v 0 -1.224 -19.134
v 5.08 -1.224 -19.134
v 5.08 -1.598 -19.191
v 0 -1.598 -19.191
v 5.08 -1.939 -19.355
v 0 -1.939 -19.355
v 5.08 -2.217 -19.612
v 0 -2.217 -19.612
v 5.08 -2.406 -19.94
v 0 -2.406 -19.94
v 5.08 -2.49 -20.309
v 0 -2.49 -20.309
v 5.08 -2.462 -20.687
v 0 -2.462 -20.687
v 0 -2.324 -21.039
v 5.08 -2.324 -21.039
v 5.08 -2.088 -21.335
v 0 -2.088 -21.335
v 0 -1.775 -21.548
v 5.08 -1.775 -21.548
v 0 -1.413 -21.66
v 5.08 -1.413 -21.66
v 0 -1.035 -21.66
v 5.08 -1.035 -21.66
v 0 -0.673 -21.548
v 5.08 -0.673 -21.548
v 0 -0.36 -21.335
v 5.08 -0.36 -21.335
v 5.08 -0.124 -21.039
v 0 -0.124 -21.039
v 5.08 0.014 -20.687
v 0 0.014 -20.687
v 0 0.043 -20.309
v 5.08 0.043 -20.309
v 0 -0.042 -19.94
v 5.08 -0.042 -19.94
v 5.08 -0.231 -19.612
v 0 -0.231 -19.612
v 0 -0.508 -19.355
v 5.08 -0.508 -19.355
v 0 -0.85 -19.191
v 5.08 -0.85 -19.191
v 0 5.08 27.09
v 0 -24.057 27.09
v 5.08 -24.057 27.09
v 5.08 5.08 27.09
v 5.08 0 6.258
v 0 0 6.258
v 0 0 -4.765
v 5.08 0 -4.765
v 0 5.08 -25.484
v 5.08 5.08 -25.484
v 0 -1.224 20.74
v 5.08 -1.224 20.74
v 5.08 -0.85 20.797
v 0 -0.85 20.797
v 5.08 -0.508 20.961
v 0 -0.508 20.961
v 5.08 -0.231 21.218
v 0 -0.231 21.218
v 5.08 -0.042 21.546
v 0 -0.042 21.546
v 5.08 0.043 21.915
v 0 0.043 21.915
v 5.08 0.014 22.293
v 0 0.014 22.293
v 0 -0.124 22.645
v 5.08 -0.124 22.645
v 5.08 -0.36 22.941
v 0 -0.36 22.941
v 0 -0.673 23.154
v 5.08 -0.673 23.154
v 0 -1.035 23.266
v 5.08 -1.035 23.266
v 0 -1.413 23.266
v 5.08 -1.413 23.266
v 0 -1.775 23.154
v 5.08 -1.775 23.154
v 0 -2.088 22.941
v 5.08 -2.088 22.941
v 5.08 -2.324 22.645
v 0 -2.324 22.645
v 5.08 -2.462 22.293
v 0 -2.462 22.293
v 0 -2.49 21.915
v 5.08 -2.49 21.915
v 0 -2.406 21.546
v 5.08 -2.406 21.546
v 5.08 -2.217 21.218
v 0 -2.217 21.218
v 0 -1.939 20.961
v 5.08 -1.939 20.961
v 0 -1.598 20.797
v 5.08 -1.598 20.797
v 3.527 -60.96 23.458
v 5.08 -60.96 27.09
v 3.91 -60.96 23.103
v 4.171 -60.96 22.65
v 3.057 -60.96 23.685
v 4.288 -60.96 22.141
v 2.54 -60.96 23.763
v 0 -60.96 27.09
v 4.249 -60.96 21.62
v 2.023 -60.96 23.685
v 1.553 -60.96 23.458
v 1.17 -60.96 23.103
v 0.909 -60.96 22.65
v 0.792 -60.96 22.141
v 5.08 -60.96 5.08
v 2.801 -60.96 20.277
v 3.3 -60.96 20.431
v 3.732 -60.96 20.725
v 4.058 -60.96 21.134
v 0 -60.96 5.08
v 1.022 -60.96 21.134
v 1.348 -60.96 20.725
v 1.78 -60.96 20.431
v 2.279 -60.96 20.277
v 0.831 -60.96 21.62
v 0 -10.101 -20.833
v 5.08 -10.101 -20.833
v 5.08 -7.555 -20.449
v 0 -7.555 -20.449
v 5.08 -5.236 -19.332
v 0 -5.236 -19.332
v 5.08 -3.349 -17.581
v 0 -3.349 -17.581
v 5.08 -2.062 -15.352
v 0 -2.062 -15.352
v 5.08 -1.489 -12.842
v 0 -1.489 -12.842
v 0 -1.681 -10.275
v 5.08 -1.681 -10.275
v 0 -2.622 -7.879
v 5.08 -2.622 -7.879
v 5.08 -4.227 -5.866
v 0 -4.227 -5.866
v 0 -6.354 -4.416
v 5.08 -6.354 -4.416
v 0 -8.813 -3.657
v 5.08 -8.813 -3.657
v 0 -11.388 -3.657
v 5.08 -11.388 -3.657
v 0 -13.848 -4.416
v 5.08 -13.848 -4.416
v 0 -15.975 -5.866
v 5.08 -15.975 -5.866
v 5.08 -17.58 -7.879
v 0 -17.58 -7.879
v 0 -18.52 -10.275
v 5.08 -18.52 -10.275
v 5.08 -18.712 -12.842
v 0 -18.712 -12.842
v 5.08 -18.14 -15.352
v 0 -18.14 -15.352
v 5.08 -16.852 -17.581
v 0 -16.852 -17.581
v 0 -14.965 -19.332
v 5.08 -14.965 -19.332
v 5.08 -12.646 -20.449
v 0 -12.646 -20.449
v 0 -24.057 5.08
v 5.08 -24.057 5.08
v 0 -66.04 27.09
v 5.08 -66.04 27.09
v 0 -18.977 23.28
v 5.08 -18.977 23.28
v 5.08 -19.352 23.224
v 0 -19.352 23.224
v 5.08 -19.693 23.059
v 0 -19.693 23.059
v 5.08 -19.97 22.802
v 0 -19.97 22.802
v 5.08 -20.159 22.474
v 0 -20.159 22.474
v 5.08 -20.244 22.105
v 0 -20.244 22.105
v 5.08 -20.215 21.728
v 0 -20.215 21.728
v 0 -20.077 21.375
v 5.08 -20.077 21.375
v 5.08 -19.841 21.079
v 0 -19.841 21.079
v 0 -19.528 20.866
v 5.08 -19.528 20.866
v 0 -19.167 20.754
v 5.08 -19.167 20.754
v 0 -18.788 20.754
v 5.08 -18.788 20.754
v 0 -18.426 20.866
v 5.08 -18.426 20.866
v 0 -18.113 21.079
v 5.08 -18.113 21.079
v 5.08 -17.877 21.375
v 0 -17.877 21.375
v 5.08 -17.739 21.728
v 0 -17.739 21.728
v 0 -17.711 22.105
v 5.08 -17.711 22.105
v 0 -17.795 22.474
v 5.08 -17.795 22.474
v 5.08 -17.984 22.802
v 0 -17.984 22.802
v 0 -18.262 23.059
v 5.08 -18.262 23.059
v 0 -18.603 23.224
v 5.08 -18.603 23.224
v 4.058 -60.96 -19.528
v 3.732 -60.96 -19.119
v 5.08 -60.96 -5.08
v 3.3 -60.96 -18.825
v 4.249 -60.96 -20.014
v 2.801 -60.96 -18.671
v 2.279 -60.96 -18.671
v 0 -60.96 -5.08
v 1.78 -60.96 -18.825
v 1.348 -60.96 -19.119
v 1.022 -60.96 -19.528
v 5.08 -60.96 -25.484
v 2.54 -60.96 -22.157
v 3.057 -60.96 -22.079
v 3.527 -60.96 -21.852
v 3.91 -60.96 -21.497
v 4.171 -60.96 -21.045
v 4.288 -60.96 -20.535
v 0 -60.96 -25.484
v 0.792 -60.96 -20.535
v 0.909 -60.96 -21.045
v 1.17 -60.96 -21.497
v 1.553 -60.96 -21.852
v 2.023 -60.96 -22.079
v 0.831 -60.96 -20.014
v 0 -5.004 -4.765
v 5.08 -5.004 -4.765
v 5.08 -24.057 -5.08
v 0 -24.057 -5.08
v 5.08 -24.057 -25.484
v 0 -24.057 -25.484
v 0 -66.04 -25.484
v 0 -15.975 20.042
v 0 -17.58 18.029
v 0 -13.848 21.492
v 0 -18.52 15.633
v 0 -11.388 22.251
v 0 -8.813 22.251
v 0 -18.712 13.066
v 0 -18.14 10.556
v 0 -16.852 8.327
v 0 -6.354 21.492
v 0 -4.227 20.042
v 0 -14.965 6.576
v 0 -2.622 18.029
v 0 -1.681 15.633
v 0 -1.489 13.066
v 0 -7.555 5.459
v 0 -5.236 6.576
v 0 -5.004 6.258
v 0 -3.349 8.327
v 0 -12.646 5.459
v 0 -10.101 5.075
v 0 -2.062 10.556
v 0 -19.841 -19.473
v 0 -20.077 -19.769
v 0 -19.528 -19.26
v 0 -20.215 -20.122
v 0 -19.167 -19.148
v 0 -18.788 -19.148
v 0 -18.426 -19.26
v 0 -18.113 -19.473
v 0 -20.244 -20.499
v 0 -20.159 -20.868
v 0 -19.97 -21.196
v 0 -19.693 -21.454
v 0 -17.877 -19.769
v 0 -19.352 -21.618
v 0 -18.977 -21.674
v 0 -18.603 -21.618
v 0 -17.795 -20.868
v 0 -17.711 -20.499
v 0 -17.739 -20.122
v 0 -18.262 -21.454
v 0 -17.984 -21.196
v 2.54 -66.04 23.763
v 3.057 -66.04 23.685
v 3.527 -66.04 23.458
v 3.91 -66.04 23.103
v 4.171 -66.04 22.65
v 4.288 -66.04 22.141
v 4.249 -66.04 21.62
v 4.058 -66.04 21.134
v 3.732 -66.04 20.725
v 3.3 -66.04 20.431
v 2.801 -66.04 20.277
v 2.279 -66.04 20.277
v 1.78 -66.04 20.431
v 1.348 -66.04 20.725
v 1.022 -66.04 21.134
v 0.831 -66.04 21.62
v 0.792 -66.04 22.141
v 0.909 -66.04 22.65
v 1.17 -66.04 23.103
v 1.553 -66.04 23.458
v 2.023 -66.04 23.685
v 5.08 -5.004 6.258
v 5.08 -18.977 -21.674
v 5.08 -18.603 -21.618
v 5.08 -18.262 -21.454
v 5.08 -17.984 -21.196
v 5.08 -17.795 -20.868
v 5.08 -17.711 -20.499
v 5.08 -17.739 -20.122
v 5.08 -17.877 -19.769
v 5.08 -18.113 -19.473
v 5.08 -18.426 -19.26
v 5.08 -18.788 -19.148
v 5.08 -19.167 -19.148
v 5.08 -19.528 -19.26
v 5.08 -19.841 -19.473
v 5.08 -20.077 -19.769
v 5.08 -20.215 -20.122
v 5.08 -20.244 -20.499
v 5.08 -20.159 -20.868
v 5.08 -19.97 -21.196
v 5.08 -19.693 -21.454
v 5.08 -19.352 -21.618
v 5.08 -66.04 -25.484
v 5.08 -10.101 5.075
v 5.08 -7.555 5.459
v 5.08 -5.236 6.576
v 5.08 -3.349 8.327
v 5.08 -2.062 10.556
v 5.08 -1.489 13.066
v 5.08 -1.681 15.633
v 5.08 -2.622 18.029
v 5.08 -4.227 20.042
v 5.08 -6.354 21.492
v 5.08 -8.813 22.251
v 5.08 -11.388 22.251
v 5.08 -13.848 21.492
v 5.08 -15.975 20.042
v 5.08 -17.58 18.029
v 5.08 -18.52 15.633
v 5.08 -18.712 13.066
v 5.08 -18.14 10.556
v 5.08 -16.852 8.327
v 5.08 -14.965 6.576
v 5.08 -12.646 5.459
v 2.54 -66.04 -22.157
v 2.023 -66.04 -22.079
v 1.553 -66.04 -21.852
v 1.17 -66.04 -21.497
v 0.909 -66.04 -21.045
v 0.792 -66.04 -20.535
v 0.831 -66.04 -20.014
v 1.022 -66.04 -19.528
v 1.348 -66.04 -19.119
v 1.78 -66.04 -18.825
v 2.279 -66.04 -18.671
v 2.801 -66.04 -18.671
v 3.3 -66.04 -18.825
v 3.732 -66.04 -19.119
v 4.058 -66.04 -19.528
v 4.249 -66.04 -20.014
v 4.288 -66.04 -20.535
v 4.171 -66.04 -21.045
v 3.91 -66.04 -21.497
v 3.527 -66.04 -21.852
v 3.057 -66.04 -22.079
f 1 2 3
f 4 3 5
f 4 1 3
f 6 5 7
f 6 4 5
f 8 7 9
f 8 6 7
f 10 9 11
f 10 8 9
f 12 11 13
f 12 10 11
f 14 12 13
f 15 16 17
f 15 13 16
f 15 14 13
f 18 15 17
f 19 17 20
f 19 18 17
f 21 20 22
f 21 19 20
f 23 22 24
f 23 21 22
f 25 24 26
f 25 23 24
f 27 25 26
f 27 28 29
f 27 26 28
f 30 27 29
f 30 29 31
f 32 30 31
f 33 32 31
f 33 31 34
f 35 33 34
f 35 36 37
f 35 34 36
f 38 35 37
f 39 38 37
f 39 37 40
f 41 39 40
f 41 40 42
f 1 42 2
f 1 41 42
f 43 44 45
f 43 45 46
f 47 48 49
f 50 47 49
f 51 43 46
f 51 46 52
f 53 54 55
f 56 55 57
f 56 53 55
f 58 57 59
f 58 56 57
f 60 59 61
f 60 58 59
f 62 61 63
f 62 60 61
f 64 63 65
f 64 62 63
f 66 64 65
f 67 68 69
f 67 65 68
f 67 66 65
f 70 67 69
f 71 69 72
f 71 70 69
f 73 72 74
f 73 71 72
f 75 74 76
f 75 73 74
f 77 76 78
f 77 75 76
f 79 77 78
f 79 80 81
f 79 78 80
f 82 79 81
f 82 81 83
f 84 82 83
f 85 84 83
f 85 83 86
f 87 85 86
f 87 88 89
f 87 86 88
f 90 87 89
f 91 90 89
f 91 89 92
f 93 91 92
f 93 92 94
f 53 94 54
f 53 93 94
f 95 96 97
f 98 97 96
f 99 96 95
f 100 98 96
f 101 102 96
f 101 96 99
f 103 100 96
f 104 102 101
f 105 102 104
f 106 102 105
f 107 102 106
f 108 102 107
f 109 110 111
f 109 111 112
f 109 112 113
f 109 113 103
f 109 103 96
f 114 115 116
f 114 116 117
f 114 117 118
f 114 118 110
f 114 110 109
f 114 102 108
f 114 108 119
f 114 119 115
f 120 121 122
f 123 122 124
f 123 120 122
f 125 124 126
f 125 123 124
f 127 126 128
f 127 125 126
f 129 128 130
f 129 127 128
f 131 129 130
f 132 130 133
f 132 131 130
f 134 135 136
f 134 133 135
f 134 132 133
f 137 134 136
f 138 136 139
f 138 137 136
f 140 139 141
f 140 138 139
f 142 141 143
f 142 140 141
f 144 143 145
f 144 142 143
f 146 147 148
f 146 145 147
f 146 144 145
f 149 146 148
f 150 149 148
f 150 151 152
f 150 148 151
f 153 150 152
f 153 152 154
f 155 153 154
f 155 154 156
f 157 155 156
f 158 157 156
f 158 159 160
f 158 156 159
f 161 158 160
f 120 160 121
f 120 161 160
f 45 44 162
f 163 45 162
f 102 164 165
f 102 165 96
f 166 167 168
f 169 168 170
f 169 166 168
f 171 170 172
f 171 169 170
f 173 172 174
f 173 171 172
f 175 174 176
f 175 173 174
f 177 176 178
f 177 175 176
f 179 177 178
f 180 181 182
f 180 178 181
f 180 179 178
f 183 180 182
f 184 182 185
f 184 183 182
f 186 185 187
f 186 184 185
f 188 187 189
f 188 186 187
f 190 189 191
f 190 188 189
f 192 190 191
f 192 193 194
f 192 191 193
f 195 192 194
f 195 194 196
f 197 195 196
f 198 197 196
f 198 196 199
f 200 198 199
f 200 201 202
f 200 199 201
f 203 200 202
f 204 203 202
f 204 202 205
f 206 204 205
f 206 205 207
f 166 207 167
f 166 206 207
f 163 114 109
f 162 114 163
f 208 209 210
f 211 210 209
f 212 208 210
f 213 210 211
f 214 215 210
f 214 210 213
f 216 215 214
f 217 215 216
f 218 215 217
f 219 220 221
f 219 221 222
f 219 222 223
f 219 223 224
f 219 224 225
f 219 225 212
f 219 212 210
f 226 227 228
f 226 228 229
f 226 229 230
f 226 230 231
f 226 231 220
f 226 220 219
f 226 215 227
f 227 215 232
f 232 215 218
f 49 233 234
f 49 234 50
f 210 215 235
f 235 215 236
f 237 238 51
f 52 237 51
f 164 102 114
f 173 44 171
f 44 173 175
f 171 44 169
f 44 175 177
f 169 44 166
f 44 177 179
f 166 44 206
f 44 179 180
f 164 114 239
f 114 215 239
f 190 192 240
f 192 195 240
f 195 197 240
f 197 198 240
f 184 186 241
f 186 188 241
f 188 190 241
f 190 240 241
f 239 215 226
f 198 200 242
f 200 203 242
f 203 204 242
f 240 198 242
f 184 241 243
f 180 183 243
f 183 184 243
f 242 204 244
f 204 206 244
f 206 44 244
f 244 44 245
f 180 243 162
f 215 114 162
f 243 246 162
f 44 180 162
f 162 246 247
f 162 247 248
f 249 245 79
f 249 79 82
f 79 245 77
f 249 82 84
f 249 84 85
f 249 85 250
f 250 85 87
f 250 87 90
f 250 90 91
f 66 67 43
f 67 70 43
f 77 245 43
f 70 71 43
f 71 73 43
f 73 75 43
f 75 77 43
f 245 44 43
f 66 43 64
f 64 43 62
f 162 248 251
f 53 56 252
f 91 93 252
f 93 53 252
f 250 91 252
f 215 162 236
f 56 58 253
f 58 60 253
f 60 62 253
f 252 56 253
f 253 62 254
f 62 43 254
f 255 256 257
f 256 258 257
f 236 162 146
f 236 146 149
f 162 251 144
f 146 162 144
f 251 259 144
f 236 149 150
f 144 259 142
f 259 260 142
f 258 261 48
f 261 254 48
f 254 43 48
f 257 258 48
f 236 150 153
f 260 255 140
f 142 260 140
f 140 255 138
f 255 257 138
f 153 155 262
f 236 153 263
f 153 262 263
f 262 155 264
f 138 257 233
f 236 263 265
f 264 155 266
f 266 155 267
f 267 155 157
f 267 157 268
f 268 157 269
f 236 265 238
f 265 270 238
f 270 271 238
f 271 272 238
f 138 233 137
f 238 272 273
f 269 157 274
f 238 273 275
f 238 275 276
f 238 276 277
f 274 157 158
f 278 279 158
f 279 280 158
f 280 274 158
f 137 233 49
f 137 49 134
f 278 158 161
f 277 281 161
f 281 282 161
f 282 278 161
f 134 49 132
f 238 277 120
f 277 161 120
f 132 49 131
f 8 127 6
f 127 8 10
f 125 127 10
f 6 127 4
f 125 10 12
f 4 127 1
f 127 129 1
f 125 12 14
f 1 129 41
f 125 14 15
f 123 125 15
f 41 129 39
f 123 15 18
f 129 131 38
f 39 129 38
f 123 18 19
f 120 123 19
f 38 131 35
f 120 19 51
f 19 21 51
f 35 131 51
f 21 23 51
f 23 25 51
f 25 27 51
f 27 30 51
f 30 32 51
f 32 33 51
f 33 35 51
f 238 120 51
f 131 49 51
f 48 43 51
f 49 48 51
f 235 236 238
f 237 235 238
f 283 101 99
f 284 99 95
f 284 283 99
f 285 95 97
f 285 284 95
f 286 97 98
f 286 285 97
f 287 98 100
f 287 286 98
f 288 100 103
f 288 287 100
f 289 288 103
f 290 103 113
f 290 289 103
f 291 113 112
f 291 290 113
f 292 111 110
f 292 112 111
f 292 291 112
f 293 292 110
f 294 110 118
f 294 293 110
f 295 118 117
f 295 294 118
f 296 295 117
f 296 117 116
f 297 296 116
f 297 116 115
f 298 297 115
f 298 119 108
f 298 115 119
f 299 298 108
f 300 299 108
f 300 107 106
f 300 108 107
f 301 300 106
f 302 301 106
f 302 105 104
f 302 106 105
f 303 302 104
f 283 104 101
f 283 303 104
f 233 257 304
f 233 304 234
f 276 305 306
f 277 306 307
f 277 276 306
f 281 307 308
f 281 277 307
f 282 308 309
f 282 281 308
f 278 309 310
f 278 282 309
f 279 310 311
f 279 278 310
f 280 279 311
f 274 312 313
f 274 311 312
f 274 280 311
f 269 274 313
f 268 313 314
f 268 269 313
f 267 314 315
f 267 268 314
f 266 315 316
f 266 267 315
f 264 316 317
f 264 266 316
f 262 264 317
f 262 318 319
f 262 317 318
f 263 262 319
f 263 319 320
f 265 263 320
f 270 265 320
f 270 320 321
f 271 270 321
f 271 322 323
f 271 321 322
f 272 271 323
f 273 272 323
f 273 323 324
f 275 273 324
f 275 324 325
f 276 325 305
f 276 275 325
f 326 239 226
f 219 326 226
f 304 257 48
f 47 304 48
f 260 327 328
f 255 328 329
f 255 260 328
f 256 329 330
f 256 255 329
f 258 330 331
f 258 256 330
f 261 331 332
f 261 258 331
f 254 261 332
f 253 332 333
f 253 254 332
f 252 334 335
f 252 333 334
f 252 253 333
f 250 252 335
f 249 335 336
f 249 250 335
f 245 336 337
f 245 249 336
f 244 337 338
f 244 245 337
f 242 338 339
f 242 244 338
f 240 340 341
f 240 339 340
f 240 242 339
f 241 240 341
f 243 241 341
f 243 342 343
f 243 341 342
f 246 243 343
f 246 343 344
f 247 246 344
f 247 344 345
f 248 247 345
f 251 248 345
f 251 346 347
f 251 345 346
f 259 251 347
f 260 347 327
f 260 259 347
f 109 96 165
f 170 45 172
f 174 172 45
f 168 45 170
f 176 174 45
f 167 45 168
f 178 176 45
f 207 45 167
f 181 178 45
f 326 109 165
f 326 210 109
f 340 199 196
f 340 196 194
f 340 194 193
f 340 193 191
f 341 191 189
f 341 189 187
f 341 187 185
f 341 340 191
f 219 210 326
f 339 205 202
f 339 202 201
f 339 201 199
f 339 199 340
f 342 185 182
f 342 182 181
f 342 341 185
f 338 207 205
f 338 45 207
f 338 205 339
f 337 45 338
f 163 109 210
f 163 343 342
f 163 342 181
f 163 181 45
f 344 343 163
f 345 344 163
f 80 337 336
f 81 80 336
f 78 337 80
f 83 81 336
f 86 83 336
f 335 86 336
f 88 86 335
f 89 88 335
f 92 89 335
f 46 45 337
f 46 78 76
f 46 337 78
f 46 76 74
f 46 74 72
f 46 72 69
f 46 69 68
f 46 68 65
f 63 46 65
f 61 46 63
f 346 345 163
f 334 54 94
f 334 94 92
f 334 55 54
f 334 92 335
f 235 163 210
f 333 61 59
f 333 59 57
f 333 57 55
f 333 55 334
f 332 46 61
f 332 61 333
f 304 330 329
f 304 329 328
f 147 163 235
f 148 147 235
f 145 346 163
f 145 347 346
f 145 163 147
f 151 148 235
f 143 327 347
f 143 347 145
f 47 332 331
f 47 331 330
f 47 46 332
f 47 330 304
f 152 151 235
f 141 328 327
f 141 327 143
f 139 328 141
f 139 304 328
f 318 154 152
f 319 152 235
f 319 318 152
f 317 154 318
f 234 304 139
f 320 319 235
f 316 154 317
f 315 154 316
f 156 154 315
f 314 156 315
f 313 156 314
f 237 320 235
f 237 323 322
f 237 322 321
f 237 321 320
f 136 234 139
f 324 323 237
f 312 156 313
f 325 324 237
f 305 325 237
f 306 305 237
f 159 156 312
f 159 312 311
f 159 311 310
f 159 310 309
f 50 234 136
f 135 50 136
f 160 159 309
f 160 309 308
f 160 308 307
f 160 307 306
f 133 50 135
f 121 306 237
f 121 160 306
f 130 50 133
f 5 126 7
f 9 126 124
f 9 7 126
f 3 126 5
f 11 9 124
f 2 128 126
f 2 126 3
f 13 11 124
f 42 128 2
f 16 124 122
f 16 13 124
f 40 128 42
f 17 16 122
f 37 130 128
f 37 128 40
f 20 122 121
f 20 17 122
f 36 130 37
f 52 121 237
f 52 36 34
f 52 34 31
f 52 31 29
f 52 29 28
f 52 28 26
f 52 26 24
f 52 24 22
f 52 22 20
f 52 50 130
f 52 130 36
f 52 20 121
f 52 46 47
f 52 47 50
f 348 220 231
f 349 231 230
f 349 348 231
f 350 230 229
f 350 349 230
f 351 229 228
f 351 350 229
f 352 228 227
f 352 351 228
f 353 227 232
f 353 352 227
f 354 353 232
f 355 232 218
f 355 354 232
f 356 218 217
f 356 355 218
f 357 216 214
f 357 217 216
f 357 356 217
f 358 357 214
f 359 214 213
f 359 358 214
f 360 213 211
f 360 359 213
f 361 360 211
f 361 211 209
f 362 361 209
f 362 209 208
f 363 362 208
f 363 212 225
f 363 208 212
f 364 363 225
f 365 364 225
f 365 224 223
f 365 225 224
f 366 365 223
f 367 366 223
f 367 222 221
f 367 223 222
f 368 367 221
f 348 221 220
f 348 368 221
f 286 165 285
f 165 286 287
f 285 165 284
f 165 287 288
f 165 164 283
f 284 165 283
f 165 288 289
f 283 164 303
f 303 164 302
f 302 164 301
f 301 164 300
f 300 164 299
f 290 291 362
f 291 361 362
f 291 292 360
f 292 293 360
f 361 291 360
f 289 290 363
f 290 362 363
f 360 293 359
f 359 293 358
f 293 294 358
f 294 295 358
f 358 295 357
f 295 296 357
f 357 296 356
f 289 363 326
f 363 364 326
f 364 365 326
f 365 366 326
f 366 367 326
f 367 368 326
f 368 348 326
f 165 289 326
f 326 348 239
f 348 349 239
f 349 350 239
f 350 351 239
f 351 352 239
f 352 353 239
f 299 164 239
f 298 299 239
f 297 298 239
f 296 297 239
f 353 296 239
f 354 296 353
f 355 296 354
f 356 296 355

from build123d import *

# Parameters (mm, degrees)
BOSS_EXTRUDE1_DEPTH = 5.08
SKETCH2_W           = 101.6
SKETCH2_H           = 10.16
CUT_EXTRUDE3_DEPTH  = 22.86
SKETCH9_R           = 1.27
CUT_EXTRUDE4_DEPTH  = 25.908
SKETCH13_W          = 11.0236
SKETCH13_H          = 5.0038
CUT_EXTRUDE5_DEPTH  = 25.908
SKETCH8_R           = 8.636
CUT_EXTRUDE6_DEPTH  = 25.908
SKETCH14_W          = 212.203069611
SKETCH14_H          = 122.52066239
SKETCH14_W_2        = 52.5744
SKETCH14_H_2        = 29.137232508
CUT_EXTRUDE7_DEPTH  = 25.908
SKETCH15_W          = 52.5744
SKETCH15_H          = 43.722211583
BOSS_EXTRUDE2_DEPTH = 5.08
SKETCH17_W          = 25.579382718
SKETCH17_H          = 36.902767492
CUT_EXTRUDE8_DEPTH  = 10.16
SKETCH18_R          = 1.7526
CUT_EXTRUDE9_DEPTH  = 10.16


with BuildPart() as part:
    # Sketch1 → Boss-Extrude1 (new body)
    with BuildSketch(Plane(origin=(0, 0, 0), x_dir=(0, 0, -1), z_dir=(1, 0, 0))):
        Polygon((62.997029703, -55.82970297), (88.397029703, -55.82970297), (88.397029703, -65.98970297), (-89.402970297, -65.98970297), (-89.402970297, -55.82970297), (-64.002970297, -55.82970297), (-64.002970297, 27.837475742), (62.997029703, 27.837475742), align=None)
    extrude(amount=BOSS_EXTRUDE1_DEPTH)

    # Sketch2 → Cut-Extrude3 (cut)
    with BuildSketch(Plane(origin=(0, 0, 0), x_dir=(0, 0, -1), z_dir=(1, 0, 0))):
        with Locations((-0.502970297, -60.90970297)):
            Rectangle(SKETCH2_W, SKETCH2_H)
    extrude(amount=CUT_EXTRUDE3_DEPTH, mode=Mode.SUBTRACT)

    # Sketch9 → Cut-Extrude4 (cut)
    with BuildSketch(Plane(origin=(0, 0, 0), x_dir=(0, 0, -1), z_dir=(1, 0, 0))):
        with Locations((-22.010170297, -1.223907747)):
            Circle(SKETCH9_R)
        with Locations(Location((-22.010170297, -18.977232508, 0), (0, 0, 180))):
            Circle(SKETCH9_R)
        with Locations((20.404229703, -18.977232508)):
            Circle(SKETCH9_R)
        with Locations(Location((20.404229703, -1.223907747, 0), (0, 0, 180))):
            Circle(SKETCH9_R)
    extrude(amount=CUT_EXTRUDE4_DEPTH, mode=Mode.SUBTRACT)

    # Sketch13 → Cut-Extrude5 (cut)
    with BuildSketch(Plane(origin=(0, 0, 0), x_dir=(0, 0, -1), z_dir=(1, 0, 0))):
        with Locations((-0.746414126, -2.5019)):
            Rectangle(SKETCH13_W, SKETCH13_H)
    extrude(amount=CUT_EXTRUDE5_DEPTH, mode=Mode.SUBTRACT)

    # Sketch8 → Cut-Extrude6 (cut)
    with BuildSketch(Plane(origin=(0, 0, 0), x_dir=(0, 0, -1), z_dir=(1, 0, 0))):
        with Locations((12.197029703, -10.100570128)):
            Circle(SKETCH8_R)
        with Locations((-13.710970297, -10.100570128)):
            Circle(SKETCH8_R)
    extrude(amount=CUT_EXTRUDE6_DEPTH, mode=Mode.SUBTRACT)

    # Sketch14 → Cut-Extrude7 (cut)
    with BuildSketch(Plane(origin=(0, 0, 0), x_dir=(0, 0, -1), z_dir=(1, 0, 0))):
        with Locations((-5.581398167, -16.698007888)):
            Rectangle(SKETCH14_W, SKETCH14_H)
        with Locations((-0.802970297, -9.488616254)):
            Rectangle(SKETCH14_W_2, SKETCH14_H_2, mode=Mode.SUBTRACT)
    extrude(amount=CUT_EXTRUDE7_DEPTH, mode=Mode.SUBTRACT)

    # Sketch15 → Boss-Extrude2 (add)
    with BuildSketch(Plane(origin=(0, 0, 0), x_dir=(0, 0, -1), z_dir=(1, 0, 0))):
        with Locations((-0.802970297, -44.178894209)):
            Rectangle(SKETCH15_W, SKETCH15_H)
    extrude(amount=BOSS_EXTRUDE2_DEPTH)

    # Sketch17 → Cut-Extrude8 (cut)
    with BuildSketch(Plane(origin=(0, 0, 0), x_dir=(0, 0, -1), z_dir=(1, 0, 0))):
        with Locations((-17.869691359, -42.508616254)):
            Rectangle(SKETCH17_W, SKETCH17_H)
        with Locations((17.869691359, -42.508616254)):
            Rectangle(SKETCH17_W, SKETCH17_H)
    extrude(amount=CUT_EXTRUDE8_DEPTH, mode=Mode.SUBTRACT)

    # Sketch18 → Cut-Extrude9 (cut)
    with BuildSketch(Plane(origin=(0, -66.04, 0), x_dir=(1, 0, 0), z_dir=(0, 1, 0))):
        with Locations(Location((2.54, -22.010170297, 0), (0, 0, 270))):
            Circle(SKETCH18_R)
        with Locations(Location((2.54, 20.404229703, 0), (0, 0, 90))):
            Circle(SKETCH18_R)
    extrude(amount=CUT_EXTRUDE9_DEPTH, mode=Mode.SUBTRACT)


solid = part.part
